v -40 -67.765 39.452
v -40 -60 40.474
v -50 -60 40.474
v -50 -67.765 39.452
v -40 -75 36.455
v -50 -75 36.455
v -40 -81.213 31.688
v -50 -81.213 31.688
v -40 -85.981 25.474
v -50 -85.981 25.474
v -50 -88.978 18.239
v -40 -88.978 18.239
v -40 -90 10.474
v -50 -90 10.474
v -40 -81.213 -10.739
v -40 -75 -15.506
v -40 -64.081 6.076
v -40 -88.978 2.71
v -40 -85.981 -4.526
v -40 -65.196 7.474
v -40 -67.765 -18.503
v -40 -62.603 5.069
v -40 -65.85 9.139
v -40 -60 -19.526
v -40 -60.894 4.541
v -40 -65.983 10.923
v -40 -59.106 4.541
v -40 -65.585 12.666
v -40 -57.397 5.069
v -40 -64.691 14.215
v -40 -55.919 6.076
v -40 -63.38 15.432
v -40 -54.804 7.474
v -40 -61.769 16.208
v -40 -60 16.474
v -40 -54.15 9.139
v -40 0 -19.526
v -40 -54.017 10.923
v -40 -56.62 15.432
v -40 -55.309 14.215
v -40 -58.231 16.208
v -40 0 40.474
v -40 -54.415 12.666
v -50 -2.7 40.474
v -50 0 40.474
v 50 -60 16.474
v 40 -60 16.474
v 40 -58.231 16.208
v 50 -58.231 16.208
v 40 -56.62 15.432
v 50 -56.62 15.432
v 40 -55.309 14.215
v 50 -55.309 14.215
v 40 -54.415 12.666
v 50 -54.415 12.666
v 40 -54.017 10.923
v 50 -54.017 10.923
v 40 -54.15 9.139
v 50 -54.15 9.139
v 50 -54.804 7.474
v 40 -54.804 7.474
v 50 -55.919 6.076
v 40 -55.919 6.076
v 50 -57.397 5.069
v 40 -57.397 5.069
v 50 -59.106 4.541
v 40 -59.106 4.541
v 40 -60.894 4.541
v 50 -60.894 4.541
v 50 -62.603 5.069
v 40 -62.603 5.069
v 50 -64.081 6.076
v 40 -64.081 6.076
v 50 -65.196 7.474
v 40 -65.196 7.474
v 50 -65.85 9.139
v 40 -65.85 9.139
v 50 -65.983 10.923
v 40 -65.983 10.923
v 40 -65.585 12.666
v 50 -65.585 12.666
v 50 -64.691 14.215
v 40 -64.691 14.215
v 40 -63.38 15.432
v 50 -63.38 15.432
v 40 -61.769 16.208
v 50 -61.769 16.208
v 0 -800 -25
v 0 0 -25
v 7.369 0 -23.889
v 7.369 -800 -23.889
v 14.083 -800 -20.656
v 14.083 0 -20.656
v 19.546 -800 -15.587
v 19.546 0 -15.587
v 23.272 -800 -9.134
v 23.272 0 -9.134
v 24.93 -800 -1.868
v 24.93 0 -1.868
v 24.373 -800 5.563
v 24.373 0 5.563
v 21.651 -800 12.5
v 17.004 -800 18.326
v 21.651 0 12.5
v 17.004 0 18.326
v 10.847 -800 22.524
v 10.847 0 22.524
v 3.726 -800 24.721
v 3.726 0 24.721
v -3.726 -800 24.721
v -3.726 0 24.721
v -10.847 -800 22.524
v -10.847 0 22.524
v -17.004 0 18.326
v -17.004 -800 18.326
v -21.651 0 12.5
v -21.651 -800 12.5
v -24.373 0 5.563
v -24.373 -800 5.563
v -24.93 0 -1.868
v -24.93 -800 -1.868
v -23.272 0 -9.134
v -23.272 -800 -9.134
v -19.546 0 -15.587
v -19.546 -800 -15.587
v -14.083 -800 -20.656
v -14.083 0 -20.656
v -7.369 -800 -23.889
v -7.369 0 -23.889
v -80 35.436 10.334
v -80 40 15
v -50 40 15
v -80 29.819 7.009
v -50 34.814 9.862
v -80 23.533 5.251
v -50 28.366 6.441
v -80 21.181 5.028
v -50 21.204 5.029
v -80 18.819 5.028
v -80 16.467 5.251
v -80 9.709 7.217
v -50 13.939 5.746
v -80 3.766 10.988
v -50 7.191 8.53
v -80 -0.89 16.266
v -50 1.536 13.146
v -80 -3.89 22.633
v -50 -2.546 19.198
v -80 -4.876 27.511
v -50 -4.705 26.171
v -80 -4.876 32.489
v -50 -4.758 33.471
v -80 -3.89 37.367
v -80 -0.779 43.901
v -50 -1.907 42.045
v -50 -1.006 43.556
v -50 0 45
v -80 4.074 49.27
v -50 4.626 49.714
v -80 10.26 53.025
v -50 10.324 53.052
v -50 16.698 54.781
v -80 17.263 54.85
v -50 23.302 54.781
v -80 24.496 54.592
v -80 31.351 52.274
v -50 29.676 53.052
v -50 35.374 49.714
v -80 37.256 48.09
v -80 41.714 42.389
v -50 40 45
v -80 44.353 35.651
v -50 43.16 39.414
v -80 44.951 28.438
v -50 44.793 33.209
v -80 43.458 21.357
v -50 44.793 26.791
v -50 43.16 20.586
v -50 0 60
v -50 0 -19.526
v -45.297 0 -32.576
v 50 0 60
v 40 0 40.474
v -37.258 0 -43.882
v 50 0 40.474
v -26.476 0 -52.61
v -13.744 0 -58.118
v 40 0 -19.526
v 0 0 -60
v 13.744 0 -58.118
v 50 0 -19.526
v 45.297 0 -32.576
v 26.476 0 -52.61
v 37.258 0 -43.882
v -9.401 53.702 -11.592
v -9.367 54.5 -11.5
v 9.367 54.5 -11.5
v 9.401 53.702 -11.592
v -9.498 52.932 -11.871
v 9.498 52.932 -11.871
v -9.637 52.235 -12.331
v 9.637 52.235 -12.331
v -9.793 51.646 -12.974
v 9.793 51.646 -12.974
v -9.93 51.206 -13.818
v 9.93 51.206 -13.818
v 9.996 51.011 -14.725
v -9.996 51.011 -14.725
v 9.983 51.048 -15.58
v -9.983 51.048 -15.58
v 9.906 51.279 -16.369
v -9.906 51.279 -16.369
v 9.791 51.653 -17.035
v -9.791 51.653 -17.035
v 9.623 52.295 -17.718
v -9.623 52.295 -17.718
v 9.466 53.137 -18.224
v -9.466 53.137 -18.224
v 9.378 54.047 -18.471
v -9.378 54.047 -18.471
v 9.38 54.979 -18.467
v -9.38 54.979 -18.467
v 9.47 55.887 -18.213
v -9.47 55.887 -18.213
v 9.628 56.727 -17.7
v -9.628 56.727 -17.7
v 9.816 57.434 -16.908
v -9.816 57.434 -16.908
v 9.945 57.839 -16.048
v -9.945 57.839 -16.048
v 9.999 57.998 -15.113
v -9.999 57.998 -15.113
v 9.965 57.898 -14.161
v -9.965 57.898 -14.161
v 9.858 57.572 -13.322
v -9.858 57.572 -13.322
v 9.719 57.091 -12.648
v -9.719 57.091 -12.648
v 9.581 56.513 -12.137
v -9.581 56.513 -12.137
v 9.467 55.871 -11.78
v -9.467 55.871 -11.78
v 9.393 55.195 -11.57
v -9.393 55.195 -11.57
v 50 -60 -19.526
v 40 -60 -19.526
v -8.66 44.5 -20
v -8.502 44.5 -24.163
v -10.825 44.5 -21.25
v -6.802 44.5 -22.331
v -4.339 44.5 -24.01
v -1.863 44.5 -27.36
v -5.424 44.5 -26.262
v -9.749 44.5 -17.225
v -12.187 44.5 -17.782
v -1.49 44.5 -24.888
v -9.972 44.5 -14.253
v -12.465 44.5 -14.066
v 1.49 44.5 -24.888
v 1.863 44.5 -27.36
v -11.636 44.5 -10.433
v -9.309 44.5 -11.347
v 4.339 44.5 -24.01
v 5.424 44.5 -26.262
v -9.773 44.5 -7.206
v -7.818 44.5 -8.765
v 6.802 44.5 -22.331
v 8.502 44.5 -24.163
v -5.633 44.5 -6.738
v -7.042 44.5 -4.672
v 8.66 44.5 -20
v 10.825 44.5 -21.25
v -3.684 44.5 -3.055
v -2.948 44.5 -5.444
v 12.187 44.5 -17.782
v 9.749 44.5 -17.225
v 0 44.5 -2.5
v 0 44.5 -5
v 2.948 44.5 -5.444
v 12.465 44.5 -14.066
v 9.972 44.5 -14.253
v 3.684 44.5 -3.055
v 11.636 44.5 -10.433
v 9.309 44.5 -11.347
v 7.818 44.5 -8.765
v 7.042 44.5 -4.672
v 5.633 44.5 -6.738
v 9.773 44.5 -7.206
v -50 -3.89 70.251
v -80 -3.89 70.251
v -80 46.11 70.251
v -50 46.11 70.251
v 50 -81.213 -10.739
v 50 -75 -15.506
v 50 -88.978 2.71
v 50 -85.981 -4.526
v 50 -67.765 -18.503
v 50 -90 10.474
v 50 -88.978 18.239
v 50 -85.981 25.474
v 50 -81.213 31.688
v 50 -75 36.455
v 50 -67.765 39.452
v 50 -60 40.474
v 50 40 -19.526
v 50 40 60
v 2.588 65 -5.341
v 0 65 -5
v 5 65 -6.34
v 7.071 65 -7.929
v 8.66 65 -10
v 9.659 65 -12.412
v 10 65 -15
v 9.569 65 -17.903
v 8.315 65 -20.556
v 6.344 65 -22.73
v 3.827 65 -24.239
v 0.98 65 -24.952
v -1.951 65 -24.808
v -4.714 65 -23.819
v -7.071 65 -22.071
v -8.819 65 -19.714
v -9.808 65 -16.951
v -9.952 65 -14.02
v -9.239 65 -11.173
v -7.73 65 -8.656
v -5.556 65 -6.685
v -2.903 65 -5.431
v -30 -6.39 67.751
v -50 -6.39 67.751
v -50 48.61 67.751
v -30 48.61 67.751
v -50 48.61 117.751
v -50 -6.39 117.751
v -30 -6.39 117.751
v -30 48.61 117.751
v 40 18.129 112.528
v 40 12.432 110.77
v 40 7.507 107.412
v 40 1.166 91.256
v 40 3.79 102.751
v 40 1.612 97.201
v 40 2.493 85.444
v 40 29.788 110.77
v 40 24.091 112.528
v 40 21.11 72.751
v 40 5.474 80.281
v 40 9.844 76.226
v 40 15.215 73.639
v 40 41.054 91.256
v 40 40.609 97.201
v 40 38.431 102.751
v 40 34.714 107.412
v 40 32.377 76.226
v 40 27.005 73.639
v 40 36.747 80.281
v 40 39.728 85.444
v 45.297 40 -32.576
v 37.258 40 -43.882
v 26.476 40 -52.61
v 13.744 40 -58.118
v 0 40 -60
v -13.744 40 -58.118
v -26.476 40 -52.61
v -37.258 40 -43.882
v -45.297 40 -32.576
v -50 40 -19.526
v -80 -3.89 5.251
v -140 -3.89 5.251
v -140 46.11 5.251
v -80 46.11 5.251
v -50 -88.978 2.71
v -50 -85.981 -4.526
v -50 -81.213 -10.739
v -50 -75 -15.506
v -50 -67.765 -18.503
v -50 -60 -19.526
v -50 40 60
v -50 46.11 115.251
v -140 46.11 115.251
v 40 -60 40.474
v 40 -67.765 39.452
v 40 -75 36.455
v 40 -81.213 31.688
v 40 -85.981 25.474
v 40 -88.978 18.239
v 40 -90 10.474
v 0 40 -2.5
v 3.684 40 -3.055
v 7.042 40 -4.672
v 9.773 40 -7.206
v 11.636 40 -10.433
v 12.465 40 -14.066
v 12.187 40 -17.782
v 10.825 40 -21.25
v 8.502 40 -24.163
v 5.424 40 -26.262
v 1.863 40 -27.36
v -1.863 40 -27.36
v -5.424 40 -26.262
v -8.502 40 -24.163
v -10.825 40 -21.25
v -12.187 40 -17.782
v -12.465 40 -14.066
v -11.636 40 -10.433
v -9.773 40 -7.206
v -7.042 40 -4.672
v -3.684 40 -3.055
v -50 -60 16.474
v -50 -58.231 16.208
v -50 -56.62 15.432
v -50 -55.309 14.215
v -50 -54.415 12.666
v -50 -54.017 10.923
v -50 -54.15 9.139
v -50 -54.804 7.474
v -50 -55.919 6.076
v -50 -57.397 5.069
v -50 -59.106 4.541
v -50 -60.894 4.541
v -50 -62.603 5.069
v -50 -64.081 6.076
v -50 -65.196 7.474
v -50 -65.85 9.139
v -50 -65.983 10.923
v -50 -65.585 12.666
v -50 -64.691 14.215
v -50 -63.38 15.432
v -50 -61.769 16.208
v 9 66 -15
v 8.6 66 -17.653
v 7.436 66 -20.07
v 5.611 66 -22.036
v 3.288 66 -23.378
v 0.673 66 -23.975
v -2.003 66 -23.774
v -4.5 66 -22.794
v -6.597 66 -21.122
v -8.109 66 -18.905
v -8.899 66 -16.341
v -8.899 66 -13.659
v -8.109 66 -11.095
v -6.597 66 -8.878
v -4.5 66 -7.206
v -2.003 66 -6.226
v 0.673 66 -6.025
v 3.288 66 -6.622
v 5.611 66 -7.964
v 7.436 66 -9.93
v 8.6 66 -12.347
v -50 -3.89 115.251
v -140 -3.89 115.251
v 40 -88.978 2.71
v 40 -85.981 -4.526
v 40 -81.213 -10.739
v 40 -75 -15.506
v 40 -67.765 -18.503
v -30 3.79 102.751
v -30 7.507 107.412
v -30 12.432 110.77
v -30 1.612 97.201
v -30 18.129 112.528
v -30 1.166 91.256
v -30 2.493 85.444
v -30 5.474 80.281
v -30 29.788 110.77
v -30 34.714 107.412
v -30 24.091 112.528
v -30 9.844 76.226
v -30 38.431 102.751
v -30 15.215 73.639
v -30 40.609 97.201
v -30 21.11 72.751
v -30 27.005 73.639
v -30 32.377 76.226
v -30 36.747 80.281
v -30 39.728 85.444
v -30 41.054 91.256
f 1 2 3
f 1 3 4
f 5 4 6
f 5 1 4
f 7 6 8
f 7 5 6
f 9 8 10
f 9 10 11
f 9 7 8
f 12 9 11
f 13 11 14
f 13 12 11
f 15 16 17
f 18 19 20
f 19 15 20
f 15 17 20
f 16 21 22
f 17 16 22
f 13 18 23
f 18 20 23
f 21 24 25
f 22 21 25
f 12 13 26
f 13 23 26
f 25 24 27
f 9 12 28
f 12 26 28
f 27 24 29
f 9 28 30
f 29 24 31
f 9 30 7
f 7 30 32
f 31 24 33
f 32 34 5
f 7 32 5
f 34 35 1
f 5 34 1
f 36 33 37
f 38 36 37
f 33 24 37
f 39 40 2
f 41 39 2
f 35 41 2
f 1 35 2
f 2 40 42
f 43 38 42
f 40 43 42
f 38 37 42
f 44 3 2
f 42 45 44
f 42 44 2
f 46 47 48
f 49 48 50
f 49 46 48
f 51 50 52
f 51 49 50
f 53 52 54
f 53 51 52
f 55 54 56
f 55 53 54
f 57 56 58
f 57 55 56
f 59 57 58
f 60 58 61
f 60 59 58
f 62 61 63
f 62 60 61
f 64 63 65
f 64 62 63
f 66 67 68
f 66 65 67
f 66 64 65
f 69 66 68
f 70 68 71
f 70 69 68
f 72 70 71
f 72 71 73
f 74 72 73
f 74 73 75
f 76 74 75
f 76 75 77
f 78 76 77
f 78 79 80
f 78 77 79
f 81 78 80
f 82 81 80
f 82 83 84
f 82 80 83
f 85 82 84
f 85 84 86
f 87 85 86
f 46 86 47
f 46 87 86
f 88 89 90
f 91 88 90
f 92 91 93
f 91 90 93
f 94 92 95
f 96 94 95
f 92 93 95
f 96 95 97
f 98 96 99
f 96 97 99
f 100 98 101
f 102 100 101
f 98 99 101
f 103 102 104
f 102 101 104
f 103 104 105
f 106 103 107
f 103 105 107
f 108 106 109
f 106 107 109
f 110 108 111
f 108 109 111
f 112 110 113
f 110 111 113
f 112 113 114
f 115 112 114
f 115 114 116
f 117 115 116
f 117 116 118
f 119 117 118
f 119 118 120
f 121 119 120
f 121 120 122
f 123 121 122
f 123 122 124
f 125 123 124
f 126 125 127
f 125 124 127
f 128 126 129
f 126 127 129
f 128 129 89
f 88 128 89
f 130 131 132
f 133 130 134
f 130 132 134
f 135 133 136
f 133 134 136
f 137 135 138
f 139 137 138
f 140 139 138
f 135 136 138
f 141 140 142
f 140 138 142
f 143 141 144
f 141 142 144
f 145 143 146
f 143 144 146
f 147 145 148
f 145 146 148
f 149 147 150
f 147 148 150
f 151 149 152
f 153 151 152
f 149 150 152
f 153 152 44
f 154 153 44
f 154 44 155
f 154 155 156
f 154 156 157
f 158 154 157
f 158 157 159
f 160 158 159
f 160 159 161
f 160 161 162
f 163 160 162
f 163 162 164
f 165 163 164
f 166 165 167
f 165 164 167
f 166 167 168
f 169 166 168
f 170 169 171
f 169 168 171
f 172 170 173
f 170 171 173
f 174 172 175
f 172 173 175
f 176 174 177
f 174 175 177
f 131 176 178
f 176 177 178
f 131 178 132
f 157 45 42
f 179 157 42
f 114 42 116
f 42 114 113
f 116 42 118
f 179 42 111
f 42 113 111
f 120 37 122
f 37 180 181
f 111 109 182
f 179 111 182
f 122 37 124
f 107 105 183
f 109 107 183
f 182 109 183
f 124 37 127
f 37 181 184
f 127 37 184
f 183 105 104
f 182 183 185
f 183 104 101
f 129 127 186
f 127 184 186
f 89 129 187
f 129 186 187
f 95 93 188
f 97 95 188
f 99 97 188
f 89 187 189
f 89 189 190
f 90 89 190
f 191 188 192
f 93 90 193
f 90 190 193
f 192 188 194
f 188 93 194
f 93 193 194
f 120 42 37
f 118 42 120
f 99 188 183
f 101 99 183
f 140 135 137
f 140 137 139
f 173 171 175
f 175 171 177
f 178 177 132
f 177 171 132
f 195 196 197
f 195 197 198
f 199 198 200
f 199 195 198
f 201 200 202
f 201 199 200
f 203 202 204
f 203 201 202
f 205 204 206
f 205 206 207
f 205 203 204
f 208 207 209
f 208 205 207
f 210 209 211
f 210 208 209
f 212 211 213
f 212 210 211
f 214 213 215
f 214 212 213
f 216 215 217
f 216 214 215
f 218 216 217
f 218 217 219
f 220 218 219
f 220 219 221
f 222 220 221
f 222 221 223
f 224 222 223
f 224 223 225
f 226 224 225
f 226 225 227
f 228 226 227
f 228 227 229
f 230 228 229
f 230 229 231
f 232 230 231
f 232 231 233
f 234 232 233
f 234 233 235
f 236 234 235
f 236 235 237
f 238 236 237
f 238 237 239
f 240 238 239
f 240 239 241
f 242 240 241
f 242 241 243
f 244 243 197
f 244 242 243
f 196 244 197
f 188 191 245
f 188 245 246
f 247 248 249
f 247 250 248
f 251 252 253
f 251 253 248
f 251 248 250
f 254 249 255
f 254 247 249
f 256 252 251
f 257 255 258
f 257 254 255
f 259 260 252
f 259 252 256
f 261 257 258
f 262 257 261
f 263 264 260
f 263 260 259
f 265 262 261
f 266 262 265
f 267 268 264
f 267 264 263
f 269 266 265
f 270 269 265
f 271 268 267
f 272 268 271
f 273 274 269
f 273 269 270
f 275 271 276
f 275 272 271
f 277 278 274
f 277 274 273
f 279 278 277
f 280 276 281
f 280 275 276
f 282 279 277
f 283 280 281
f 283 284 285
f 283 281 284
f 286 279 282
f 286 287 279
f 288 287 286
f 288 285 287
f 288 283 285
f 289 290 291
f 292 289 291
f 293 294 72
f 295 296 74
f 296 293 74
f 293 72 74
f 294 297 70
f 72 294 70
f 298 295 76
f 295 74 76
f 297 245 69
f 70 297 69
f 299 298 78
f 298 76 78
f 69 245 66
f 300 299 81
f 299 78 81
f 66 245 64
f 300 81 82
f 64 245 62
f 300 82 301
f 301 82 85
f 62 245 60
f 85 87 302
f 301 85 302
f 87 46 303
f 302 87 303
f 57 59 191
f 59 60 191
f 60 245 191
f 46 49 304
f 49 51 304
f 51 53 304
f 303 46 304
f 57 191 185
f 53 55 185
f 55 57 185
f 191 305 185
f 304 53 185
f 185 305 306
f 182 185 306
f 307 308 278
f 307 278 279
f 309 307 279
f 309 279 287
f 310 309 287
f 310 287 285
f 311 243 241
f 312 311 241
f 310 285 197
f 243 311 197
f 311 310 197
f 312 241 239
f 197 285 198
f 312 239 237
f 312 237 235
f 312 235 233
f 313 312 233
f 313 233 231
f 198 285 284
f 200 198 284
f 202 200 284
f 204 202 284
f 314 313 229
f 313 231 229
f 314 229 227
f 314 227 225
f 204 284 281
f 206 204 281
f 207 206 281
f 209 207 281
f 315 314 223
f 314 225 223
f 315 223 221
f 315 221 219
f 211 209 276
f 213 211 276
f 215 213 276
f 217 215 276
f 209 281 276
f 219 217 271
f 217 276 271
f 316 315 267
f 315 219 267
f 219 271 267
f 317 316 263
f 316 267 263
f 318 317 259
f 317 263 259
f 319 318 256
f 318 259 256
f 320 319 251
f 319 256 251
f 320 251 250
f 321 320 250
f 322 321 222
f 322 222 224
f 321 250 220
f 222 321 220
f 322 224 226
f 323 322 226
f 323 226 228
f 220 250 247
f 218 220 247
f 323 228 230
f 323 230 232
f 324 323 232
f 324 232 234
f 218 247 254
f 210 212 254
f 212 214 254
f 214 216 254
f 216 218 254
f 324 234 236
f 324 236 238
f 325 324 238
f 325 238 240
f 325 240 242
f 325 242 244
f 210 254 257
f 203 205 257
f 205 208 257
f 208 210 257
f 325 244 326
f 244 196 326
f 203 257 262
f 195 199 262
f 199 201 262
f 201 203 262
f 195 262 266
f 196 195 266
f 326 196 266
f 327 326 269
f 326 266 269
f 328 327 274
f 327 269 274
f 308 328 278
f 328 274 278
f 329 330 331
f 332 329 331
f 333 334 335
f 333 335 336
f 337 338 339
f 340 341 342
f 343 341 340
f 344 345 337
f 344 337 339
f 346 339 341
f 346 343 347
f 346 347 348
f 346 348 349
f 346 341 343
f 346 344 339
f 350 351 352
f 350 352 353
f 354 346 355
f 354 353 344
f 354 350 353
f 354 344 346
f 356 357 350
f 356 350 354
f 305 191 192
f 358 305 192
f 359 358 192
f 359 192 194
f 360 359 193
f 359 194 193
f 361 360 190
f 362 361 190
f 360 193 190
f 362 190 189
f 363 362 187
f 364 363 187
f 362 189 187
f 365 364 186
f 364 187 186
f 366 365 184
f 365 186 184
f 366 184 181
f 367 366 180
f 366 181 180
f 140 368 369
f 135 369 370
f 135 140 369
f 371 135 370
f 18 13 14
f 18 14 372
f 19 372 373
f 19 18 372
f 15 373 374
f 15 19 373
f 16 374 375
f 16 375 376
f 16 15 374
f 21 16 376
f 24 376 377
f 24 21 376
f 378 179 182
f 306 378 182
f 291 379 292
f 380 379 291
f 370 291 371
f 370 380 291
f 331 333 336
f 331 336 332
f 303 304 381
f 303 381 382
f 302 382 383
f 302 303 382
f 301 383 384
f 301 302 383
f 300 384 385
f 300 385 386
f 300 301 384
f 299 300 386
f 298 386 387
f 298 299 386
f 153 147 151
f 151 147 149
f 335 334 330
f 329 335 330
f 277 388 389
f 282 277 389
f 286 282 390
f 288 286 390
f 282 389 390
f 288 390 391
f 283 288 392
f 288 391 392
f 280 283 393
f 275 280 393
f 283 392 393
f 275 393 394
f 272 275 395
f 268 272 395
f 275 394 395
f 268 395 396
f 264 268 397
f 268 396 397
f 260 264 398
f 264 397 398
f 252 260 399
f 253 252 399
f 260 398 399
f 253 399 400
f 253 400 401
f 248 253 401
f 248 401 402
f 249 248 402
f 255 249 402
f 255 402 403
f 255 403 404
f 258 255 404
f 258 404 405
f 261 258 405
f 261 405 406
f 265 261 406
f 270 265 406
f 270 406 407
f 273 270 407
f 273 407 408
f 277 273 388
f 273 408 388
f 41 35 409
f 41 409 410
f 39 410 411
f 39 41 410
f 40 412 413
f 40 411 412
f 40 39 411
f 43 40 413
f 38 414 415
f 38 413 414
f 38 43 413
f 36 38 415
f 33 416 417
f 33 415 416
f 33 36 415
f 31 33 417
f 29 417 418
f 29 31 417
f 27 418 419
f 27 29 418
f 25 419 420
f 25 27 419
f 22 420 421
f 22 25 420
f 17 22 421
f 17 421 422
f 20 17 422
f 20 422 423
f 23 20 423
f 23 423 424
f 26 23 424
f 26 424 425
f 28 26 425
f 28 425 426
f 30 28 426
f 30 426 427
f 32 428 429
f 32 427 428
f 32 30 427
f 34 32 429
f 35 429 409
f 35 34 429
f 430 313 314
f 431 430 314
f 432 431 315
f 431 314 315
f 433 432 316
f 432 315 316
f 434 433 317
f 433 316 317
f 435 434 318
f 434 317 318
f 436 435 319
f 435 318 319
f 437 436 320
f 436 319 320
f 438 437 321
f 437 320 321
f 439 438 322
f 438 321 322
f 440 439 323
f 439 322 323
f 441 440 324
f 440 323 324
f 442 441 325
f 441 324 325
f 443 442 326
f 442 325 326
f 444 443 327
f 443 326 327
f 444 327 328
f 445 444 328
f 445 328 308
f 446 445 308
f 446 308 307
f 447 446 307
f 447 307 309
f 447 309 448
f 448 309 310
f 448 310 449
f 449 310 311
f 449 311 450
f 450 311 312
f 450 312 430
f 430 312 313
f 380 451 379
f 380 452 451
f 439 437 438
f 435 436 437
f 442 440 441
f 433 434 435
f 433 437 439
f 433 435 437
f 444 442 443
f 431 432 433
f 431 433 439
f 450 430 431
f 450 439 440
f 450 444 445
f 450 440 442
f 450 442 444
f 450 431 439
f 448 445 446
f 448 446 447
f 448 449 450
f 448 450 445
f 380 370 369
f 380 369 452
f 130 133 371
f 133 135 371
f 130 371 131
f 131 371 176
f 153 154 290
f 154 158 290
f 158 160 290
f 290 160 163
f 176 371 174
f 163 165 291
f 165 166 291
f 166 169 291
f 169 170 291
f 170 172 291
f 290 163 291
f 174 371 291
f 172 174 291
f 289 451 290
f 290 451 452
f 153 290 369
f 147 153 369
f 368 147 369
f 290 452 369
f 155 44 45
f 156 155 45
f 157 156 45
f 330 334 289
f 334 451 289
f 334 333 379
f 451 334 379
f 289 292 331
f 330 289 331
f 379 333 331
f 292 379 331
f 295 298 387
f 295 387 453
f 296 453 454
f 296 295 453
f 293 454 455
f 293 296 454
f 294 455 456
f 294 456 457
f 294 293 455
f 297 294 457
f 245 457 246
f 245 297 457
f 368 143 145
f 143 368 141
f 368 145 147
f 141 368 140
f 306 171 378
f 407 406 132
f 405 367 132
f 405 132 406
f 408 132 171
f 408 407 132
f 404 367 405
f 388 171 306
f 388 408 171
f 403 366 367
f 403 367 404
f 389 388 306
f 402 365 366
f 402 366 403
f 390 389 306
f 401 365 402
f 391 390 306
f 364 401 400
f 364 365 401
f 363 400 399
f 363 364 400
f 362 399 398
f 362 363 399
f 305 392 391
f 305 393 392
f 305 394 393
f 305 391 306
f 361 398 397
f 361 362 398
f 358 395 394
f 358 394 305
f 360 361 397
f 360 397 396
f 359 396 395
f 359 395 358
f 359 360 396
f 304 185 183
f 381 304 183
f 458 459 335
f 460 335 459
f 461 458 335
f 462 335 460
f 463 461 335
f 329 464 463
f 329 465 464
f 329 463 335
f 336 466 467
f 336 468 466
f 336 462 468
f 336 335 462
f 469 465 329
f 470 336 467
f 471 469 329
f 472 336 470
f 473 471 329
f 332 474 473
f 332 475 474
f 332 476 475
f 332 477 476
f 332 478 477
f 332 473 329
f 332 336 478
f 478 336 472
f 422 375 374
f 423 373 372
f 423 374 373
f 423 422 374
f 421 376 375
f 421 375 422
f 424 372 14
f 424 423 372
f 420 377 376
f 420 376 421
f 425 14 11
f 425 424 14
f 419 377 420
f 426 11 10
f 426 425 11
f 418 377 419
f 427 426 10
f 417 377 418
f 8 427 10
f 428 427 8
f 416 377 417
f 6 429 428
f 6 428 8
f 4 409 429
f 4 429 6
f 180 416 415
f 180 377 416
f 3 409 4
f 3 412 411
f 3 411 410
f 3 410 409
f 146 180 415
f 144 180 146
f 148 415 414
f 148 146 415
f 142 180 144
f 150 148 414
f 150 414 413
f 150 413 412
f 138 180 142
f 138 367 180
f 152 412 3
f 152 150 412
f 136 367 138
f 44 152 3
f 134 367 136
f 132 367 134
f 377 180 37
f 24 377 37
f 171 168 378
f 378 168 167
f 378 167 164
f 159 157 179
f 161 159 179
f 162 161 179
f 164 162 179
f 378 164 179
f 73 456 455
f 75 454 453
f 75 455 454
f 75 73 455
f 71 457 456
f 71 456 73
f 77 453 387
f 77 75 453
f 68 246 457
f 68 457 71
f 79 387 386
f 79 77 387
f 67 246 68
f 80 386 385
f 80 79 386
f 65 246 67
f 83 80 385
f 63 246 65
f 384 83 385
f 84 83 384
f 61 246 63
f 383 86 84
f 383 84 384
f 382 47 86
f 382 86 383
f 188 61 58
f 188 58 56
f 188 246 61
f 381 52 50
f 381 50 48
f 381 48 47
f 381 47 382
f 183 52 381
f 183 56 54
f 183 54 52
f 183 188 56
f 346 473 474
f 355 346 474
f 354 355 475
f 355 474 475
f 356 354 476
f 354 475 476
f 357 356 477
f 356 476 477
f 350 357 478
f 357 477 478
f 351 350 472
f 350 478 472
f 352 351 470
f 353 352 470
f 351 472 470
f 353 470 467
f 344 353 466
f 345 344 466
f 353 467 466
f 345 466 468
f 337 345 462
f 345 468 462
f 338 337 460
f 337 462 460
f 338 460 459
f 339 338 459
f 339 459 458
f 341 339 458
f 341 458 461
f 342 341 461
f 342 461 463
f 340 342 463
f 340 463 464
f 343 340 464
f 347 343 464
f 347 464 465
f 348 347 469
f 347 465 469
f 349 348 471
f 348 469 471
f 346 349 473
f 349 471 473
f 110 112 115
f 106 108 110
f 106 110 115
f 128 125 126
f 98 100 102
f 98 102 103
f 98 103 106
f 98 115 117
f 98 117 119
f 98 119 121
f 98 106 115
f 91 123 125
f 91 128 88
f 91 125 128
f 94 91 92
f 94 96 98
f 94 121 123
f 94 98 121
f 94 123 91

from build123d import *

# Parameters (mm, degrees)
SALIENTE_EXTRUIR2_DEPTH    = 40
CROQUIS2_R                 = 12.5
SALIENTE_EXTRUIR3_DEPTH    = 4.5
CROQUIS3_R                 = 10
SALIENTE_EXTRUIR4_DEPTH    = 21.5
CORTAR_EXTRUIR1_DEPTH      = 21.5
CORTAR_EXTRUIR1_DEPTH_BACK = 21.5
CROQUIS4_R                 = 3.5
CHAFL_N1_SIZE              = 1
CROQUIS5_R                 = 25
SALIENTE_EXTRUIR5_DEPTH    = 30
CROQUIS6_W                 = 110
CROQUIS6_H                 = 50
SALIENTE_EXTRUIR6_DEPTH    = 60
CROQUIS10_W                = 45
CROQUIS10_H                = 50
SALIENTE_EXTRUIR7_DEPTH    = 30
CROQUIS12_W                = 50
CROQUIS12_H                = 55
SALIENTE_EXTRUIR8_DEPTH    = 20
CROQUIS13_R                = 20
SALIENTE_EXTRUIR9_DEPTH    = 70
CROQUIS14_W                = 10
CROQUIS14_H                = 60
SALIENTE_EXTRUIR10_DEPTH   = 90
CROQUIS15_R                = 6
CORTAR_EXTRUIR4_DEPTH      = 136
CROQUIS16_R                = 25
SALIENTE_EXTRUIR11_DEPTH   = 800


with BuildPart() as part:
    # Croquis1 → Saliente-Extruir2 (new body)
    with BuildSketch(Plane(origin=(0, 0, 0), x_dir=(1, 0, 0), z_dir=(0, 1, 0))):
        with BuildLine():
            Line((-50, 19.52562419), (-50, -60))
            Line((-50, -60), (50, -60))
            Line((50, -60), (50, 19.52562419))
            ThreePointArc((50, 19.52562419), (0, 60), (-50, 19.52562419))
        make_face()
    extrude(amount=SALIENTE_EXTRUIR2_DEPTH)

    # Croquis2 → Saliente-Extruir3 (add)
    with BuildSketch(Plane(origin=(0, 40, 0), x_dir=(1, 0, 0), z_dir=(0, 1, 0))):
        with Locations((0, 15)):
            Circle(CROQUIS2_R)
    extrude(amount=SALIENTE_EXTRUIR3_DEPTH)

    # Croquis3 → Saliente-Extruir4 (add)
    with BuildSketch(Plane(origin=(0, 44.5, 0), x_dir=(1, 0, 0), z_dir=(0, 1, 0))):
        with Locations((0, 15)):
            Circle(CROQUIS3_R)
    extrude(amount=SALIENTE_EXTRUIR4_DEPTH)

    # Croquis4 → Cortar-Extruir1 (cut, two sides: drawn at the far end of the back side and taken through both)
    with BuildSketch(Plane(origin=(0, 0, 0), x_dir=(0, 0, -1), z_dir=(1, 0, 0)).offset(-CORTAR_EXTRUIR1_DEPTH_BACK)):
        with Locations((15, 54.5)):
            Circle(CROQUIS4_R)
    extrude(amount=CORTAR_EXTRUIR1_DEPTH + CORTAR_EXTRUIR1_DEPTH_BACK, mode=Mode.SUBTRACT)

    # Chaflán1
    chafl_n1_edges = [part.edges().sort_by_distance(p)[0] for p in [
        (-10, 66, -15),
    ]]
    chamfer(chafl_n1_edges, length=CHAFL_N1_SIZE)

    # Croquis5 → Saliente-Extruir5 (add)
    with BuildSketch(Plane.ZY.offset(50)):
        with Locations((30, 20)):
            Circle(CROQUIS5_R)
    extrude(amount=SALIENTE_EXTRUIR5_DEPTH)

    # Croquis6 → Saliente-Extruir6 (add)
    with BuildSketch(Plane.ZY.offset(80)):
        with Locations((60.2509382, 21.110140405)):
            Rectangle(CROQUIS6_W, CROQUIS6_H)
    extrude(amount=SALIENTE_EXTRUIR6_DEPTH)

    # Croquis10 → Saliente-Extruir7 (add)
    with BuildSketch(Plane(origin=(-80, 0, 0), x_dir=(0, 0, -1), z_dir=(1, 0, 0))):
        with Locations((-92.7509382, 21.110140405)):
            Rectangle(CROQUIS10_W, CROQUIS10_H)
    extrude(amount=SALIENTE_EXTRUIR7_DEPTH)

    # Croquis12 → Saliente-Extruir8 (add)
    with BuildSketch(Plane(origin=(-50, 0, 0), x_dir=(0, 0, -1), z_dir=(1, 0, 0))):
        with Locations((-92.7509382, 21.110140405)):
            Rectangle(CROQUIS12_W, CROQUIS12_H)
    extrude(amount=SALIENTE_EXTRUIR8_DEPTH)

    # Croquis13 → Saliente-Extruir9 (add)
    with BuildSketch(Plane(origin=(-30, 0, 0), x_dir=(0, 0, -1), z_dir=(1, 0, 0))):
        with Locations((-92.7509382, 21.110140405)):
            Circle(CROQUIS13_R)
    extrude(amount=SALIENTE_EXTRUIR9_DEPTH)

    # Croquis14 → Saliente-Extruir10 (add)
    with BuildSketch(Plane.XZ):
        with Locations((-45, 10.47437581)):
            Rectangle(CROQUIS14_W, CROQUIS14_H)
    saliente_extruir10 = extrude(amount=SALIENTE_EXTRUIR10_DEPTH)

    # Simetría1: Saliente-Extruir10 across plane
    add(saliente_extruir10.mirror(Plane(origin=(0, 0, 0), x_dir=(0, 0, 1), z_dir=(1, 0, 0))))

    # Croquis15 → Cortar-Extruir4 (cut)
    with BuildSketch(Plane.ZY.offset(50)):
        with BuildLine():
            Line((-19.52562419, -90), (10.474375689, -90))
            ThreePointArc((10.474375689, -90), (-10.738827668, -81.213203393), (-19.52562419, -60))
            Line((-19.52562419, -60), (-19.52562419, -90))
        make_face()
        with BuildLine():
            Line((40.47437581, -90), (40.47437581, -60))
            ThreePointArc((40.47437581, -60), (31.687579203, -81.213203478), (10.474375689, -90))
            Line((10.474375689, -90), (40.47437581, -90))
        make_face()
        with Locations((10.47437581, -60)):
            Circle(CROQUIS15_R)
    extrude(amount=-CORTAR_EXTRUIR4_DEPTH, mode=Mode.SUBTRACT)

    # Croquis16 → Saliente-Extruir11 (add)
    with BuildSketch(Plane(origin=(0, 0, 0), x_dir=(-1, 0, 0), z_dir=(0, -1, 0))):
        Circle(CROQUIS16_R)
    extrude(amount=SALIENTE_EXTRUIR11_DEPTH)


solid = part.part
